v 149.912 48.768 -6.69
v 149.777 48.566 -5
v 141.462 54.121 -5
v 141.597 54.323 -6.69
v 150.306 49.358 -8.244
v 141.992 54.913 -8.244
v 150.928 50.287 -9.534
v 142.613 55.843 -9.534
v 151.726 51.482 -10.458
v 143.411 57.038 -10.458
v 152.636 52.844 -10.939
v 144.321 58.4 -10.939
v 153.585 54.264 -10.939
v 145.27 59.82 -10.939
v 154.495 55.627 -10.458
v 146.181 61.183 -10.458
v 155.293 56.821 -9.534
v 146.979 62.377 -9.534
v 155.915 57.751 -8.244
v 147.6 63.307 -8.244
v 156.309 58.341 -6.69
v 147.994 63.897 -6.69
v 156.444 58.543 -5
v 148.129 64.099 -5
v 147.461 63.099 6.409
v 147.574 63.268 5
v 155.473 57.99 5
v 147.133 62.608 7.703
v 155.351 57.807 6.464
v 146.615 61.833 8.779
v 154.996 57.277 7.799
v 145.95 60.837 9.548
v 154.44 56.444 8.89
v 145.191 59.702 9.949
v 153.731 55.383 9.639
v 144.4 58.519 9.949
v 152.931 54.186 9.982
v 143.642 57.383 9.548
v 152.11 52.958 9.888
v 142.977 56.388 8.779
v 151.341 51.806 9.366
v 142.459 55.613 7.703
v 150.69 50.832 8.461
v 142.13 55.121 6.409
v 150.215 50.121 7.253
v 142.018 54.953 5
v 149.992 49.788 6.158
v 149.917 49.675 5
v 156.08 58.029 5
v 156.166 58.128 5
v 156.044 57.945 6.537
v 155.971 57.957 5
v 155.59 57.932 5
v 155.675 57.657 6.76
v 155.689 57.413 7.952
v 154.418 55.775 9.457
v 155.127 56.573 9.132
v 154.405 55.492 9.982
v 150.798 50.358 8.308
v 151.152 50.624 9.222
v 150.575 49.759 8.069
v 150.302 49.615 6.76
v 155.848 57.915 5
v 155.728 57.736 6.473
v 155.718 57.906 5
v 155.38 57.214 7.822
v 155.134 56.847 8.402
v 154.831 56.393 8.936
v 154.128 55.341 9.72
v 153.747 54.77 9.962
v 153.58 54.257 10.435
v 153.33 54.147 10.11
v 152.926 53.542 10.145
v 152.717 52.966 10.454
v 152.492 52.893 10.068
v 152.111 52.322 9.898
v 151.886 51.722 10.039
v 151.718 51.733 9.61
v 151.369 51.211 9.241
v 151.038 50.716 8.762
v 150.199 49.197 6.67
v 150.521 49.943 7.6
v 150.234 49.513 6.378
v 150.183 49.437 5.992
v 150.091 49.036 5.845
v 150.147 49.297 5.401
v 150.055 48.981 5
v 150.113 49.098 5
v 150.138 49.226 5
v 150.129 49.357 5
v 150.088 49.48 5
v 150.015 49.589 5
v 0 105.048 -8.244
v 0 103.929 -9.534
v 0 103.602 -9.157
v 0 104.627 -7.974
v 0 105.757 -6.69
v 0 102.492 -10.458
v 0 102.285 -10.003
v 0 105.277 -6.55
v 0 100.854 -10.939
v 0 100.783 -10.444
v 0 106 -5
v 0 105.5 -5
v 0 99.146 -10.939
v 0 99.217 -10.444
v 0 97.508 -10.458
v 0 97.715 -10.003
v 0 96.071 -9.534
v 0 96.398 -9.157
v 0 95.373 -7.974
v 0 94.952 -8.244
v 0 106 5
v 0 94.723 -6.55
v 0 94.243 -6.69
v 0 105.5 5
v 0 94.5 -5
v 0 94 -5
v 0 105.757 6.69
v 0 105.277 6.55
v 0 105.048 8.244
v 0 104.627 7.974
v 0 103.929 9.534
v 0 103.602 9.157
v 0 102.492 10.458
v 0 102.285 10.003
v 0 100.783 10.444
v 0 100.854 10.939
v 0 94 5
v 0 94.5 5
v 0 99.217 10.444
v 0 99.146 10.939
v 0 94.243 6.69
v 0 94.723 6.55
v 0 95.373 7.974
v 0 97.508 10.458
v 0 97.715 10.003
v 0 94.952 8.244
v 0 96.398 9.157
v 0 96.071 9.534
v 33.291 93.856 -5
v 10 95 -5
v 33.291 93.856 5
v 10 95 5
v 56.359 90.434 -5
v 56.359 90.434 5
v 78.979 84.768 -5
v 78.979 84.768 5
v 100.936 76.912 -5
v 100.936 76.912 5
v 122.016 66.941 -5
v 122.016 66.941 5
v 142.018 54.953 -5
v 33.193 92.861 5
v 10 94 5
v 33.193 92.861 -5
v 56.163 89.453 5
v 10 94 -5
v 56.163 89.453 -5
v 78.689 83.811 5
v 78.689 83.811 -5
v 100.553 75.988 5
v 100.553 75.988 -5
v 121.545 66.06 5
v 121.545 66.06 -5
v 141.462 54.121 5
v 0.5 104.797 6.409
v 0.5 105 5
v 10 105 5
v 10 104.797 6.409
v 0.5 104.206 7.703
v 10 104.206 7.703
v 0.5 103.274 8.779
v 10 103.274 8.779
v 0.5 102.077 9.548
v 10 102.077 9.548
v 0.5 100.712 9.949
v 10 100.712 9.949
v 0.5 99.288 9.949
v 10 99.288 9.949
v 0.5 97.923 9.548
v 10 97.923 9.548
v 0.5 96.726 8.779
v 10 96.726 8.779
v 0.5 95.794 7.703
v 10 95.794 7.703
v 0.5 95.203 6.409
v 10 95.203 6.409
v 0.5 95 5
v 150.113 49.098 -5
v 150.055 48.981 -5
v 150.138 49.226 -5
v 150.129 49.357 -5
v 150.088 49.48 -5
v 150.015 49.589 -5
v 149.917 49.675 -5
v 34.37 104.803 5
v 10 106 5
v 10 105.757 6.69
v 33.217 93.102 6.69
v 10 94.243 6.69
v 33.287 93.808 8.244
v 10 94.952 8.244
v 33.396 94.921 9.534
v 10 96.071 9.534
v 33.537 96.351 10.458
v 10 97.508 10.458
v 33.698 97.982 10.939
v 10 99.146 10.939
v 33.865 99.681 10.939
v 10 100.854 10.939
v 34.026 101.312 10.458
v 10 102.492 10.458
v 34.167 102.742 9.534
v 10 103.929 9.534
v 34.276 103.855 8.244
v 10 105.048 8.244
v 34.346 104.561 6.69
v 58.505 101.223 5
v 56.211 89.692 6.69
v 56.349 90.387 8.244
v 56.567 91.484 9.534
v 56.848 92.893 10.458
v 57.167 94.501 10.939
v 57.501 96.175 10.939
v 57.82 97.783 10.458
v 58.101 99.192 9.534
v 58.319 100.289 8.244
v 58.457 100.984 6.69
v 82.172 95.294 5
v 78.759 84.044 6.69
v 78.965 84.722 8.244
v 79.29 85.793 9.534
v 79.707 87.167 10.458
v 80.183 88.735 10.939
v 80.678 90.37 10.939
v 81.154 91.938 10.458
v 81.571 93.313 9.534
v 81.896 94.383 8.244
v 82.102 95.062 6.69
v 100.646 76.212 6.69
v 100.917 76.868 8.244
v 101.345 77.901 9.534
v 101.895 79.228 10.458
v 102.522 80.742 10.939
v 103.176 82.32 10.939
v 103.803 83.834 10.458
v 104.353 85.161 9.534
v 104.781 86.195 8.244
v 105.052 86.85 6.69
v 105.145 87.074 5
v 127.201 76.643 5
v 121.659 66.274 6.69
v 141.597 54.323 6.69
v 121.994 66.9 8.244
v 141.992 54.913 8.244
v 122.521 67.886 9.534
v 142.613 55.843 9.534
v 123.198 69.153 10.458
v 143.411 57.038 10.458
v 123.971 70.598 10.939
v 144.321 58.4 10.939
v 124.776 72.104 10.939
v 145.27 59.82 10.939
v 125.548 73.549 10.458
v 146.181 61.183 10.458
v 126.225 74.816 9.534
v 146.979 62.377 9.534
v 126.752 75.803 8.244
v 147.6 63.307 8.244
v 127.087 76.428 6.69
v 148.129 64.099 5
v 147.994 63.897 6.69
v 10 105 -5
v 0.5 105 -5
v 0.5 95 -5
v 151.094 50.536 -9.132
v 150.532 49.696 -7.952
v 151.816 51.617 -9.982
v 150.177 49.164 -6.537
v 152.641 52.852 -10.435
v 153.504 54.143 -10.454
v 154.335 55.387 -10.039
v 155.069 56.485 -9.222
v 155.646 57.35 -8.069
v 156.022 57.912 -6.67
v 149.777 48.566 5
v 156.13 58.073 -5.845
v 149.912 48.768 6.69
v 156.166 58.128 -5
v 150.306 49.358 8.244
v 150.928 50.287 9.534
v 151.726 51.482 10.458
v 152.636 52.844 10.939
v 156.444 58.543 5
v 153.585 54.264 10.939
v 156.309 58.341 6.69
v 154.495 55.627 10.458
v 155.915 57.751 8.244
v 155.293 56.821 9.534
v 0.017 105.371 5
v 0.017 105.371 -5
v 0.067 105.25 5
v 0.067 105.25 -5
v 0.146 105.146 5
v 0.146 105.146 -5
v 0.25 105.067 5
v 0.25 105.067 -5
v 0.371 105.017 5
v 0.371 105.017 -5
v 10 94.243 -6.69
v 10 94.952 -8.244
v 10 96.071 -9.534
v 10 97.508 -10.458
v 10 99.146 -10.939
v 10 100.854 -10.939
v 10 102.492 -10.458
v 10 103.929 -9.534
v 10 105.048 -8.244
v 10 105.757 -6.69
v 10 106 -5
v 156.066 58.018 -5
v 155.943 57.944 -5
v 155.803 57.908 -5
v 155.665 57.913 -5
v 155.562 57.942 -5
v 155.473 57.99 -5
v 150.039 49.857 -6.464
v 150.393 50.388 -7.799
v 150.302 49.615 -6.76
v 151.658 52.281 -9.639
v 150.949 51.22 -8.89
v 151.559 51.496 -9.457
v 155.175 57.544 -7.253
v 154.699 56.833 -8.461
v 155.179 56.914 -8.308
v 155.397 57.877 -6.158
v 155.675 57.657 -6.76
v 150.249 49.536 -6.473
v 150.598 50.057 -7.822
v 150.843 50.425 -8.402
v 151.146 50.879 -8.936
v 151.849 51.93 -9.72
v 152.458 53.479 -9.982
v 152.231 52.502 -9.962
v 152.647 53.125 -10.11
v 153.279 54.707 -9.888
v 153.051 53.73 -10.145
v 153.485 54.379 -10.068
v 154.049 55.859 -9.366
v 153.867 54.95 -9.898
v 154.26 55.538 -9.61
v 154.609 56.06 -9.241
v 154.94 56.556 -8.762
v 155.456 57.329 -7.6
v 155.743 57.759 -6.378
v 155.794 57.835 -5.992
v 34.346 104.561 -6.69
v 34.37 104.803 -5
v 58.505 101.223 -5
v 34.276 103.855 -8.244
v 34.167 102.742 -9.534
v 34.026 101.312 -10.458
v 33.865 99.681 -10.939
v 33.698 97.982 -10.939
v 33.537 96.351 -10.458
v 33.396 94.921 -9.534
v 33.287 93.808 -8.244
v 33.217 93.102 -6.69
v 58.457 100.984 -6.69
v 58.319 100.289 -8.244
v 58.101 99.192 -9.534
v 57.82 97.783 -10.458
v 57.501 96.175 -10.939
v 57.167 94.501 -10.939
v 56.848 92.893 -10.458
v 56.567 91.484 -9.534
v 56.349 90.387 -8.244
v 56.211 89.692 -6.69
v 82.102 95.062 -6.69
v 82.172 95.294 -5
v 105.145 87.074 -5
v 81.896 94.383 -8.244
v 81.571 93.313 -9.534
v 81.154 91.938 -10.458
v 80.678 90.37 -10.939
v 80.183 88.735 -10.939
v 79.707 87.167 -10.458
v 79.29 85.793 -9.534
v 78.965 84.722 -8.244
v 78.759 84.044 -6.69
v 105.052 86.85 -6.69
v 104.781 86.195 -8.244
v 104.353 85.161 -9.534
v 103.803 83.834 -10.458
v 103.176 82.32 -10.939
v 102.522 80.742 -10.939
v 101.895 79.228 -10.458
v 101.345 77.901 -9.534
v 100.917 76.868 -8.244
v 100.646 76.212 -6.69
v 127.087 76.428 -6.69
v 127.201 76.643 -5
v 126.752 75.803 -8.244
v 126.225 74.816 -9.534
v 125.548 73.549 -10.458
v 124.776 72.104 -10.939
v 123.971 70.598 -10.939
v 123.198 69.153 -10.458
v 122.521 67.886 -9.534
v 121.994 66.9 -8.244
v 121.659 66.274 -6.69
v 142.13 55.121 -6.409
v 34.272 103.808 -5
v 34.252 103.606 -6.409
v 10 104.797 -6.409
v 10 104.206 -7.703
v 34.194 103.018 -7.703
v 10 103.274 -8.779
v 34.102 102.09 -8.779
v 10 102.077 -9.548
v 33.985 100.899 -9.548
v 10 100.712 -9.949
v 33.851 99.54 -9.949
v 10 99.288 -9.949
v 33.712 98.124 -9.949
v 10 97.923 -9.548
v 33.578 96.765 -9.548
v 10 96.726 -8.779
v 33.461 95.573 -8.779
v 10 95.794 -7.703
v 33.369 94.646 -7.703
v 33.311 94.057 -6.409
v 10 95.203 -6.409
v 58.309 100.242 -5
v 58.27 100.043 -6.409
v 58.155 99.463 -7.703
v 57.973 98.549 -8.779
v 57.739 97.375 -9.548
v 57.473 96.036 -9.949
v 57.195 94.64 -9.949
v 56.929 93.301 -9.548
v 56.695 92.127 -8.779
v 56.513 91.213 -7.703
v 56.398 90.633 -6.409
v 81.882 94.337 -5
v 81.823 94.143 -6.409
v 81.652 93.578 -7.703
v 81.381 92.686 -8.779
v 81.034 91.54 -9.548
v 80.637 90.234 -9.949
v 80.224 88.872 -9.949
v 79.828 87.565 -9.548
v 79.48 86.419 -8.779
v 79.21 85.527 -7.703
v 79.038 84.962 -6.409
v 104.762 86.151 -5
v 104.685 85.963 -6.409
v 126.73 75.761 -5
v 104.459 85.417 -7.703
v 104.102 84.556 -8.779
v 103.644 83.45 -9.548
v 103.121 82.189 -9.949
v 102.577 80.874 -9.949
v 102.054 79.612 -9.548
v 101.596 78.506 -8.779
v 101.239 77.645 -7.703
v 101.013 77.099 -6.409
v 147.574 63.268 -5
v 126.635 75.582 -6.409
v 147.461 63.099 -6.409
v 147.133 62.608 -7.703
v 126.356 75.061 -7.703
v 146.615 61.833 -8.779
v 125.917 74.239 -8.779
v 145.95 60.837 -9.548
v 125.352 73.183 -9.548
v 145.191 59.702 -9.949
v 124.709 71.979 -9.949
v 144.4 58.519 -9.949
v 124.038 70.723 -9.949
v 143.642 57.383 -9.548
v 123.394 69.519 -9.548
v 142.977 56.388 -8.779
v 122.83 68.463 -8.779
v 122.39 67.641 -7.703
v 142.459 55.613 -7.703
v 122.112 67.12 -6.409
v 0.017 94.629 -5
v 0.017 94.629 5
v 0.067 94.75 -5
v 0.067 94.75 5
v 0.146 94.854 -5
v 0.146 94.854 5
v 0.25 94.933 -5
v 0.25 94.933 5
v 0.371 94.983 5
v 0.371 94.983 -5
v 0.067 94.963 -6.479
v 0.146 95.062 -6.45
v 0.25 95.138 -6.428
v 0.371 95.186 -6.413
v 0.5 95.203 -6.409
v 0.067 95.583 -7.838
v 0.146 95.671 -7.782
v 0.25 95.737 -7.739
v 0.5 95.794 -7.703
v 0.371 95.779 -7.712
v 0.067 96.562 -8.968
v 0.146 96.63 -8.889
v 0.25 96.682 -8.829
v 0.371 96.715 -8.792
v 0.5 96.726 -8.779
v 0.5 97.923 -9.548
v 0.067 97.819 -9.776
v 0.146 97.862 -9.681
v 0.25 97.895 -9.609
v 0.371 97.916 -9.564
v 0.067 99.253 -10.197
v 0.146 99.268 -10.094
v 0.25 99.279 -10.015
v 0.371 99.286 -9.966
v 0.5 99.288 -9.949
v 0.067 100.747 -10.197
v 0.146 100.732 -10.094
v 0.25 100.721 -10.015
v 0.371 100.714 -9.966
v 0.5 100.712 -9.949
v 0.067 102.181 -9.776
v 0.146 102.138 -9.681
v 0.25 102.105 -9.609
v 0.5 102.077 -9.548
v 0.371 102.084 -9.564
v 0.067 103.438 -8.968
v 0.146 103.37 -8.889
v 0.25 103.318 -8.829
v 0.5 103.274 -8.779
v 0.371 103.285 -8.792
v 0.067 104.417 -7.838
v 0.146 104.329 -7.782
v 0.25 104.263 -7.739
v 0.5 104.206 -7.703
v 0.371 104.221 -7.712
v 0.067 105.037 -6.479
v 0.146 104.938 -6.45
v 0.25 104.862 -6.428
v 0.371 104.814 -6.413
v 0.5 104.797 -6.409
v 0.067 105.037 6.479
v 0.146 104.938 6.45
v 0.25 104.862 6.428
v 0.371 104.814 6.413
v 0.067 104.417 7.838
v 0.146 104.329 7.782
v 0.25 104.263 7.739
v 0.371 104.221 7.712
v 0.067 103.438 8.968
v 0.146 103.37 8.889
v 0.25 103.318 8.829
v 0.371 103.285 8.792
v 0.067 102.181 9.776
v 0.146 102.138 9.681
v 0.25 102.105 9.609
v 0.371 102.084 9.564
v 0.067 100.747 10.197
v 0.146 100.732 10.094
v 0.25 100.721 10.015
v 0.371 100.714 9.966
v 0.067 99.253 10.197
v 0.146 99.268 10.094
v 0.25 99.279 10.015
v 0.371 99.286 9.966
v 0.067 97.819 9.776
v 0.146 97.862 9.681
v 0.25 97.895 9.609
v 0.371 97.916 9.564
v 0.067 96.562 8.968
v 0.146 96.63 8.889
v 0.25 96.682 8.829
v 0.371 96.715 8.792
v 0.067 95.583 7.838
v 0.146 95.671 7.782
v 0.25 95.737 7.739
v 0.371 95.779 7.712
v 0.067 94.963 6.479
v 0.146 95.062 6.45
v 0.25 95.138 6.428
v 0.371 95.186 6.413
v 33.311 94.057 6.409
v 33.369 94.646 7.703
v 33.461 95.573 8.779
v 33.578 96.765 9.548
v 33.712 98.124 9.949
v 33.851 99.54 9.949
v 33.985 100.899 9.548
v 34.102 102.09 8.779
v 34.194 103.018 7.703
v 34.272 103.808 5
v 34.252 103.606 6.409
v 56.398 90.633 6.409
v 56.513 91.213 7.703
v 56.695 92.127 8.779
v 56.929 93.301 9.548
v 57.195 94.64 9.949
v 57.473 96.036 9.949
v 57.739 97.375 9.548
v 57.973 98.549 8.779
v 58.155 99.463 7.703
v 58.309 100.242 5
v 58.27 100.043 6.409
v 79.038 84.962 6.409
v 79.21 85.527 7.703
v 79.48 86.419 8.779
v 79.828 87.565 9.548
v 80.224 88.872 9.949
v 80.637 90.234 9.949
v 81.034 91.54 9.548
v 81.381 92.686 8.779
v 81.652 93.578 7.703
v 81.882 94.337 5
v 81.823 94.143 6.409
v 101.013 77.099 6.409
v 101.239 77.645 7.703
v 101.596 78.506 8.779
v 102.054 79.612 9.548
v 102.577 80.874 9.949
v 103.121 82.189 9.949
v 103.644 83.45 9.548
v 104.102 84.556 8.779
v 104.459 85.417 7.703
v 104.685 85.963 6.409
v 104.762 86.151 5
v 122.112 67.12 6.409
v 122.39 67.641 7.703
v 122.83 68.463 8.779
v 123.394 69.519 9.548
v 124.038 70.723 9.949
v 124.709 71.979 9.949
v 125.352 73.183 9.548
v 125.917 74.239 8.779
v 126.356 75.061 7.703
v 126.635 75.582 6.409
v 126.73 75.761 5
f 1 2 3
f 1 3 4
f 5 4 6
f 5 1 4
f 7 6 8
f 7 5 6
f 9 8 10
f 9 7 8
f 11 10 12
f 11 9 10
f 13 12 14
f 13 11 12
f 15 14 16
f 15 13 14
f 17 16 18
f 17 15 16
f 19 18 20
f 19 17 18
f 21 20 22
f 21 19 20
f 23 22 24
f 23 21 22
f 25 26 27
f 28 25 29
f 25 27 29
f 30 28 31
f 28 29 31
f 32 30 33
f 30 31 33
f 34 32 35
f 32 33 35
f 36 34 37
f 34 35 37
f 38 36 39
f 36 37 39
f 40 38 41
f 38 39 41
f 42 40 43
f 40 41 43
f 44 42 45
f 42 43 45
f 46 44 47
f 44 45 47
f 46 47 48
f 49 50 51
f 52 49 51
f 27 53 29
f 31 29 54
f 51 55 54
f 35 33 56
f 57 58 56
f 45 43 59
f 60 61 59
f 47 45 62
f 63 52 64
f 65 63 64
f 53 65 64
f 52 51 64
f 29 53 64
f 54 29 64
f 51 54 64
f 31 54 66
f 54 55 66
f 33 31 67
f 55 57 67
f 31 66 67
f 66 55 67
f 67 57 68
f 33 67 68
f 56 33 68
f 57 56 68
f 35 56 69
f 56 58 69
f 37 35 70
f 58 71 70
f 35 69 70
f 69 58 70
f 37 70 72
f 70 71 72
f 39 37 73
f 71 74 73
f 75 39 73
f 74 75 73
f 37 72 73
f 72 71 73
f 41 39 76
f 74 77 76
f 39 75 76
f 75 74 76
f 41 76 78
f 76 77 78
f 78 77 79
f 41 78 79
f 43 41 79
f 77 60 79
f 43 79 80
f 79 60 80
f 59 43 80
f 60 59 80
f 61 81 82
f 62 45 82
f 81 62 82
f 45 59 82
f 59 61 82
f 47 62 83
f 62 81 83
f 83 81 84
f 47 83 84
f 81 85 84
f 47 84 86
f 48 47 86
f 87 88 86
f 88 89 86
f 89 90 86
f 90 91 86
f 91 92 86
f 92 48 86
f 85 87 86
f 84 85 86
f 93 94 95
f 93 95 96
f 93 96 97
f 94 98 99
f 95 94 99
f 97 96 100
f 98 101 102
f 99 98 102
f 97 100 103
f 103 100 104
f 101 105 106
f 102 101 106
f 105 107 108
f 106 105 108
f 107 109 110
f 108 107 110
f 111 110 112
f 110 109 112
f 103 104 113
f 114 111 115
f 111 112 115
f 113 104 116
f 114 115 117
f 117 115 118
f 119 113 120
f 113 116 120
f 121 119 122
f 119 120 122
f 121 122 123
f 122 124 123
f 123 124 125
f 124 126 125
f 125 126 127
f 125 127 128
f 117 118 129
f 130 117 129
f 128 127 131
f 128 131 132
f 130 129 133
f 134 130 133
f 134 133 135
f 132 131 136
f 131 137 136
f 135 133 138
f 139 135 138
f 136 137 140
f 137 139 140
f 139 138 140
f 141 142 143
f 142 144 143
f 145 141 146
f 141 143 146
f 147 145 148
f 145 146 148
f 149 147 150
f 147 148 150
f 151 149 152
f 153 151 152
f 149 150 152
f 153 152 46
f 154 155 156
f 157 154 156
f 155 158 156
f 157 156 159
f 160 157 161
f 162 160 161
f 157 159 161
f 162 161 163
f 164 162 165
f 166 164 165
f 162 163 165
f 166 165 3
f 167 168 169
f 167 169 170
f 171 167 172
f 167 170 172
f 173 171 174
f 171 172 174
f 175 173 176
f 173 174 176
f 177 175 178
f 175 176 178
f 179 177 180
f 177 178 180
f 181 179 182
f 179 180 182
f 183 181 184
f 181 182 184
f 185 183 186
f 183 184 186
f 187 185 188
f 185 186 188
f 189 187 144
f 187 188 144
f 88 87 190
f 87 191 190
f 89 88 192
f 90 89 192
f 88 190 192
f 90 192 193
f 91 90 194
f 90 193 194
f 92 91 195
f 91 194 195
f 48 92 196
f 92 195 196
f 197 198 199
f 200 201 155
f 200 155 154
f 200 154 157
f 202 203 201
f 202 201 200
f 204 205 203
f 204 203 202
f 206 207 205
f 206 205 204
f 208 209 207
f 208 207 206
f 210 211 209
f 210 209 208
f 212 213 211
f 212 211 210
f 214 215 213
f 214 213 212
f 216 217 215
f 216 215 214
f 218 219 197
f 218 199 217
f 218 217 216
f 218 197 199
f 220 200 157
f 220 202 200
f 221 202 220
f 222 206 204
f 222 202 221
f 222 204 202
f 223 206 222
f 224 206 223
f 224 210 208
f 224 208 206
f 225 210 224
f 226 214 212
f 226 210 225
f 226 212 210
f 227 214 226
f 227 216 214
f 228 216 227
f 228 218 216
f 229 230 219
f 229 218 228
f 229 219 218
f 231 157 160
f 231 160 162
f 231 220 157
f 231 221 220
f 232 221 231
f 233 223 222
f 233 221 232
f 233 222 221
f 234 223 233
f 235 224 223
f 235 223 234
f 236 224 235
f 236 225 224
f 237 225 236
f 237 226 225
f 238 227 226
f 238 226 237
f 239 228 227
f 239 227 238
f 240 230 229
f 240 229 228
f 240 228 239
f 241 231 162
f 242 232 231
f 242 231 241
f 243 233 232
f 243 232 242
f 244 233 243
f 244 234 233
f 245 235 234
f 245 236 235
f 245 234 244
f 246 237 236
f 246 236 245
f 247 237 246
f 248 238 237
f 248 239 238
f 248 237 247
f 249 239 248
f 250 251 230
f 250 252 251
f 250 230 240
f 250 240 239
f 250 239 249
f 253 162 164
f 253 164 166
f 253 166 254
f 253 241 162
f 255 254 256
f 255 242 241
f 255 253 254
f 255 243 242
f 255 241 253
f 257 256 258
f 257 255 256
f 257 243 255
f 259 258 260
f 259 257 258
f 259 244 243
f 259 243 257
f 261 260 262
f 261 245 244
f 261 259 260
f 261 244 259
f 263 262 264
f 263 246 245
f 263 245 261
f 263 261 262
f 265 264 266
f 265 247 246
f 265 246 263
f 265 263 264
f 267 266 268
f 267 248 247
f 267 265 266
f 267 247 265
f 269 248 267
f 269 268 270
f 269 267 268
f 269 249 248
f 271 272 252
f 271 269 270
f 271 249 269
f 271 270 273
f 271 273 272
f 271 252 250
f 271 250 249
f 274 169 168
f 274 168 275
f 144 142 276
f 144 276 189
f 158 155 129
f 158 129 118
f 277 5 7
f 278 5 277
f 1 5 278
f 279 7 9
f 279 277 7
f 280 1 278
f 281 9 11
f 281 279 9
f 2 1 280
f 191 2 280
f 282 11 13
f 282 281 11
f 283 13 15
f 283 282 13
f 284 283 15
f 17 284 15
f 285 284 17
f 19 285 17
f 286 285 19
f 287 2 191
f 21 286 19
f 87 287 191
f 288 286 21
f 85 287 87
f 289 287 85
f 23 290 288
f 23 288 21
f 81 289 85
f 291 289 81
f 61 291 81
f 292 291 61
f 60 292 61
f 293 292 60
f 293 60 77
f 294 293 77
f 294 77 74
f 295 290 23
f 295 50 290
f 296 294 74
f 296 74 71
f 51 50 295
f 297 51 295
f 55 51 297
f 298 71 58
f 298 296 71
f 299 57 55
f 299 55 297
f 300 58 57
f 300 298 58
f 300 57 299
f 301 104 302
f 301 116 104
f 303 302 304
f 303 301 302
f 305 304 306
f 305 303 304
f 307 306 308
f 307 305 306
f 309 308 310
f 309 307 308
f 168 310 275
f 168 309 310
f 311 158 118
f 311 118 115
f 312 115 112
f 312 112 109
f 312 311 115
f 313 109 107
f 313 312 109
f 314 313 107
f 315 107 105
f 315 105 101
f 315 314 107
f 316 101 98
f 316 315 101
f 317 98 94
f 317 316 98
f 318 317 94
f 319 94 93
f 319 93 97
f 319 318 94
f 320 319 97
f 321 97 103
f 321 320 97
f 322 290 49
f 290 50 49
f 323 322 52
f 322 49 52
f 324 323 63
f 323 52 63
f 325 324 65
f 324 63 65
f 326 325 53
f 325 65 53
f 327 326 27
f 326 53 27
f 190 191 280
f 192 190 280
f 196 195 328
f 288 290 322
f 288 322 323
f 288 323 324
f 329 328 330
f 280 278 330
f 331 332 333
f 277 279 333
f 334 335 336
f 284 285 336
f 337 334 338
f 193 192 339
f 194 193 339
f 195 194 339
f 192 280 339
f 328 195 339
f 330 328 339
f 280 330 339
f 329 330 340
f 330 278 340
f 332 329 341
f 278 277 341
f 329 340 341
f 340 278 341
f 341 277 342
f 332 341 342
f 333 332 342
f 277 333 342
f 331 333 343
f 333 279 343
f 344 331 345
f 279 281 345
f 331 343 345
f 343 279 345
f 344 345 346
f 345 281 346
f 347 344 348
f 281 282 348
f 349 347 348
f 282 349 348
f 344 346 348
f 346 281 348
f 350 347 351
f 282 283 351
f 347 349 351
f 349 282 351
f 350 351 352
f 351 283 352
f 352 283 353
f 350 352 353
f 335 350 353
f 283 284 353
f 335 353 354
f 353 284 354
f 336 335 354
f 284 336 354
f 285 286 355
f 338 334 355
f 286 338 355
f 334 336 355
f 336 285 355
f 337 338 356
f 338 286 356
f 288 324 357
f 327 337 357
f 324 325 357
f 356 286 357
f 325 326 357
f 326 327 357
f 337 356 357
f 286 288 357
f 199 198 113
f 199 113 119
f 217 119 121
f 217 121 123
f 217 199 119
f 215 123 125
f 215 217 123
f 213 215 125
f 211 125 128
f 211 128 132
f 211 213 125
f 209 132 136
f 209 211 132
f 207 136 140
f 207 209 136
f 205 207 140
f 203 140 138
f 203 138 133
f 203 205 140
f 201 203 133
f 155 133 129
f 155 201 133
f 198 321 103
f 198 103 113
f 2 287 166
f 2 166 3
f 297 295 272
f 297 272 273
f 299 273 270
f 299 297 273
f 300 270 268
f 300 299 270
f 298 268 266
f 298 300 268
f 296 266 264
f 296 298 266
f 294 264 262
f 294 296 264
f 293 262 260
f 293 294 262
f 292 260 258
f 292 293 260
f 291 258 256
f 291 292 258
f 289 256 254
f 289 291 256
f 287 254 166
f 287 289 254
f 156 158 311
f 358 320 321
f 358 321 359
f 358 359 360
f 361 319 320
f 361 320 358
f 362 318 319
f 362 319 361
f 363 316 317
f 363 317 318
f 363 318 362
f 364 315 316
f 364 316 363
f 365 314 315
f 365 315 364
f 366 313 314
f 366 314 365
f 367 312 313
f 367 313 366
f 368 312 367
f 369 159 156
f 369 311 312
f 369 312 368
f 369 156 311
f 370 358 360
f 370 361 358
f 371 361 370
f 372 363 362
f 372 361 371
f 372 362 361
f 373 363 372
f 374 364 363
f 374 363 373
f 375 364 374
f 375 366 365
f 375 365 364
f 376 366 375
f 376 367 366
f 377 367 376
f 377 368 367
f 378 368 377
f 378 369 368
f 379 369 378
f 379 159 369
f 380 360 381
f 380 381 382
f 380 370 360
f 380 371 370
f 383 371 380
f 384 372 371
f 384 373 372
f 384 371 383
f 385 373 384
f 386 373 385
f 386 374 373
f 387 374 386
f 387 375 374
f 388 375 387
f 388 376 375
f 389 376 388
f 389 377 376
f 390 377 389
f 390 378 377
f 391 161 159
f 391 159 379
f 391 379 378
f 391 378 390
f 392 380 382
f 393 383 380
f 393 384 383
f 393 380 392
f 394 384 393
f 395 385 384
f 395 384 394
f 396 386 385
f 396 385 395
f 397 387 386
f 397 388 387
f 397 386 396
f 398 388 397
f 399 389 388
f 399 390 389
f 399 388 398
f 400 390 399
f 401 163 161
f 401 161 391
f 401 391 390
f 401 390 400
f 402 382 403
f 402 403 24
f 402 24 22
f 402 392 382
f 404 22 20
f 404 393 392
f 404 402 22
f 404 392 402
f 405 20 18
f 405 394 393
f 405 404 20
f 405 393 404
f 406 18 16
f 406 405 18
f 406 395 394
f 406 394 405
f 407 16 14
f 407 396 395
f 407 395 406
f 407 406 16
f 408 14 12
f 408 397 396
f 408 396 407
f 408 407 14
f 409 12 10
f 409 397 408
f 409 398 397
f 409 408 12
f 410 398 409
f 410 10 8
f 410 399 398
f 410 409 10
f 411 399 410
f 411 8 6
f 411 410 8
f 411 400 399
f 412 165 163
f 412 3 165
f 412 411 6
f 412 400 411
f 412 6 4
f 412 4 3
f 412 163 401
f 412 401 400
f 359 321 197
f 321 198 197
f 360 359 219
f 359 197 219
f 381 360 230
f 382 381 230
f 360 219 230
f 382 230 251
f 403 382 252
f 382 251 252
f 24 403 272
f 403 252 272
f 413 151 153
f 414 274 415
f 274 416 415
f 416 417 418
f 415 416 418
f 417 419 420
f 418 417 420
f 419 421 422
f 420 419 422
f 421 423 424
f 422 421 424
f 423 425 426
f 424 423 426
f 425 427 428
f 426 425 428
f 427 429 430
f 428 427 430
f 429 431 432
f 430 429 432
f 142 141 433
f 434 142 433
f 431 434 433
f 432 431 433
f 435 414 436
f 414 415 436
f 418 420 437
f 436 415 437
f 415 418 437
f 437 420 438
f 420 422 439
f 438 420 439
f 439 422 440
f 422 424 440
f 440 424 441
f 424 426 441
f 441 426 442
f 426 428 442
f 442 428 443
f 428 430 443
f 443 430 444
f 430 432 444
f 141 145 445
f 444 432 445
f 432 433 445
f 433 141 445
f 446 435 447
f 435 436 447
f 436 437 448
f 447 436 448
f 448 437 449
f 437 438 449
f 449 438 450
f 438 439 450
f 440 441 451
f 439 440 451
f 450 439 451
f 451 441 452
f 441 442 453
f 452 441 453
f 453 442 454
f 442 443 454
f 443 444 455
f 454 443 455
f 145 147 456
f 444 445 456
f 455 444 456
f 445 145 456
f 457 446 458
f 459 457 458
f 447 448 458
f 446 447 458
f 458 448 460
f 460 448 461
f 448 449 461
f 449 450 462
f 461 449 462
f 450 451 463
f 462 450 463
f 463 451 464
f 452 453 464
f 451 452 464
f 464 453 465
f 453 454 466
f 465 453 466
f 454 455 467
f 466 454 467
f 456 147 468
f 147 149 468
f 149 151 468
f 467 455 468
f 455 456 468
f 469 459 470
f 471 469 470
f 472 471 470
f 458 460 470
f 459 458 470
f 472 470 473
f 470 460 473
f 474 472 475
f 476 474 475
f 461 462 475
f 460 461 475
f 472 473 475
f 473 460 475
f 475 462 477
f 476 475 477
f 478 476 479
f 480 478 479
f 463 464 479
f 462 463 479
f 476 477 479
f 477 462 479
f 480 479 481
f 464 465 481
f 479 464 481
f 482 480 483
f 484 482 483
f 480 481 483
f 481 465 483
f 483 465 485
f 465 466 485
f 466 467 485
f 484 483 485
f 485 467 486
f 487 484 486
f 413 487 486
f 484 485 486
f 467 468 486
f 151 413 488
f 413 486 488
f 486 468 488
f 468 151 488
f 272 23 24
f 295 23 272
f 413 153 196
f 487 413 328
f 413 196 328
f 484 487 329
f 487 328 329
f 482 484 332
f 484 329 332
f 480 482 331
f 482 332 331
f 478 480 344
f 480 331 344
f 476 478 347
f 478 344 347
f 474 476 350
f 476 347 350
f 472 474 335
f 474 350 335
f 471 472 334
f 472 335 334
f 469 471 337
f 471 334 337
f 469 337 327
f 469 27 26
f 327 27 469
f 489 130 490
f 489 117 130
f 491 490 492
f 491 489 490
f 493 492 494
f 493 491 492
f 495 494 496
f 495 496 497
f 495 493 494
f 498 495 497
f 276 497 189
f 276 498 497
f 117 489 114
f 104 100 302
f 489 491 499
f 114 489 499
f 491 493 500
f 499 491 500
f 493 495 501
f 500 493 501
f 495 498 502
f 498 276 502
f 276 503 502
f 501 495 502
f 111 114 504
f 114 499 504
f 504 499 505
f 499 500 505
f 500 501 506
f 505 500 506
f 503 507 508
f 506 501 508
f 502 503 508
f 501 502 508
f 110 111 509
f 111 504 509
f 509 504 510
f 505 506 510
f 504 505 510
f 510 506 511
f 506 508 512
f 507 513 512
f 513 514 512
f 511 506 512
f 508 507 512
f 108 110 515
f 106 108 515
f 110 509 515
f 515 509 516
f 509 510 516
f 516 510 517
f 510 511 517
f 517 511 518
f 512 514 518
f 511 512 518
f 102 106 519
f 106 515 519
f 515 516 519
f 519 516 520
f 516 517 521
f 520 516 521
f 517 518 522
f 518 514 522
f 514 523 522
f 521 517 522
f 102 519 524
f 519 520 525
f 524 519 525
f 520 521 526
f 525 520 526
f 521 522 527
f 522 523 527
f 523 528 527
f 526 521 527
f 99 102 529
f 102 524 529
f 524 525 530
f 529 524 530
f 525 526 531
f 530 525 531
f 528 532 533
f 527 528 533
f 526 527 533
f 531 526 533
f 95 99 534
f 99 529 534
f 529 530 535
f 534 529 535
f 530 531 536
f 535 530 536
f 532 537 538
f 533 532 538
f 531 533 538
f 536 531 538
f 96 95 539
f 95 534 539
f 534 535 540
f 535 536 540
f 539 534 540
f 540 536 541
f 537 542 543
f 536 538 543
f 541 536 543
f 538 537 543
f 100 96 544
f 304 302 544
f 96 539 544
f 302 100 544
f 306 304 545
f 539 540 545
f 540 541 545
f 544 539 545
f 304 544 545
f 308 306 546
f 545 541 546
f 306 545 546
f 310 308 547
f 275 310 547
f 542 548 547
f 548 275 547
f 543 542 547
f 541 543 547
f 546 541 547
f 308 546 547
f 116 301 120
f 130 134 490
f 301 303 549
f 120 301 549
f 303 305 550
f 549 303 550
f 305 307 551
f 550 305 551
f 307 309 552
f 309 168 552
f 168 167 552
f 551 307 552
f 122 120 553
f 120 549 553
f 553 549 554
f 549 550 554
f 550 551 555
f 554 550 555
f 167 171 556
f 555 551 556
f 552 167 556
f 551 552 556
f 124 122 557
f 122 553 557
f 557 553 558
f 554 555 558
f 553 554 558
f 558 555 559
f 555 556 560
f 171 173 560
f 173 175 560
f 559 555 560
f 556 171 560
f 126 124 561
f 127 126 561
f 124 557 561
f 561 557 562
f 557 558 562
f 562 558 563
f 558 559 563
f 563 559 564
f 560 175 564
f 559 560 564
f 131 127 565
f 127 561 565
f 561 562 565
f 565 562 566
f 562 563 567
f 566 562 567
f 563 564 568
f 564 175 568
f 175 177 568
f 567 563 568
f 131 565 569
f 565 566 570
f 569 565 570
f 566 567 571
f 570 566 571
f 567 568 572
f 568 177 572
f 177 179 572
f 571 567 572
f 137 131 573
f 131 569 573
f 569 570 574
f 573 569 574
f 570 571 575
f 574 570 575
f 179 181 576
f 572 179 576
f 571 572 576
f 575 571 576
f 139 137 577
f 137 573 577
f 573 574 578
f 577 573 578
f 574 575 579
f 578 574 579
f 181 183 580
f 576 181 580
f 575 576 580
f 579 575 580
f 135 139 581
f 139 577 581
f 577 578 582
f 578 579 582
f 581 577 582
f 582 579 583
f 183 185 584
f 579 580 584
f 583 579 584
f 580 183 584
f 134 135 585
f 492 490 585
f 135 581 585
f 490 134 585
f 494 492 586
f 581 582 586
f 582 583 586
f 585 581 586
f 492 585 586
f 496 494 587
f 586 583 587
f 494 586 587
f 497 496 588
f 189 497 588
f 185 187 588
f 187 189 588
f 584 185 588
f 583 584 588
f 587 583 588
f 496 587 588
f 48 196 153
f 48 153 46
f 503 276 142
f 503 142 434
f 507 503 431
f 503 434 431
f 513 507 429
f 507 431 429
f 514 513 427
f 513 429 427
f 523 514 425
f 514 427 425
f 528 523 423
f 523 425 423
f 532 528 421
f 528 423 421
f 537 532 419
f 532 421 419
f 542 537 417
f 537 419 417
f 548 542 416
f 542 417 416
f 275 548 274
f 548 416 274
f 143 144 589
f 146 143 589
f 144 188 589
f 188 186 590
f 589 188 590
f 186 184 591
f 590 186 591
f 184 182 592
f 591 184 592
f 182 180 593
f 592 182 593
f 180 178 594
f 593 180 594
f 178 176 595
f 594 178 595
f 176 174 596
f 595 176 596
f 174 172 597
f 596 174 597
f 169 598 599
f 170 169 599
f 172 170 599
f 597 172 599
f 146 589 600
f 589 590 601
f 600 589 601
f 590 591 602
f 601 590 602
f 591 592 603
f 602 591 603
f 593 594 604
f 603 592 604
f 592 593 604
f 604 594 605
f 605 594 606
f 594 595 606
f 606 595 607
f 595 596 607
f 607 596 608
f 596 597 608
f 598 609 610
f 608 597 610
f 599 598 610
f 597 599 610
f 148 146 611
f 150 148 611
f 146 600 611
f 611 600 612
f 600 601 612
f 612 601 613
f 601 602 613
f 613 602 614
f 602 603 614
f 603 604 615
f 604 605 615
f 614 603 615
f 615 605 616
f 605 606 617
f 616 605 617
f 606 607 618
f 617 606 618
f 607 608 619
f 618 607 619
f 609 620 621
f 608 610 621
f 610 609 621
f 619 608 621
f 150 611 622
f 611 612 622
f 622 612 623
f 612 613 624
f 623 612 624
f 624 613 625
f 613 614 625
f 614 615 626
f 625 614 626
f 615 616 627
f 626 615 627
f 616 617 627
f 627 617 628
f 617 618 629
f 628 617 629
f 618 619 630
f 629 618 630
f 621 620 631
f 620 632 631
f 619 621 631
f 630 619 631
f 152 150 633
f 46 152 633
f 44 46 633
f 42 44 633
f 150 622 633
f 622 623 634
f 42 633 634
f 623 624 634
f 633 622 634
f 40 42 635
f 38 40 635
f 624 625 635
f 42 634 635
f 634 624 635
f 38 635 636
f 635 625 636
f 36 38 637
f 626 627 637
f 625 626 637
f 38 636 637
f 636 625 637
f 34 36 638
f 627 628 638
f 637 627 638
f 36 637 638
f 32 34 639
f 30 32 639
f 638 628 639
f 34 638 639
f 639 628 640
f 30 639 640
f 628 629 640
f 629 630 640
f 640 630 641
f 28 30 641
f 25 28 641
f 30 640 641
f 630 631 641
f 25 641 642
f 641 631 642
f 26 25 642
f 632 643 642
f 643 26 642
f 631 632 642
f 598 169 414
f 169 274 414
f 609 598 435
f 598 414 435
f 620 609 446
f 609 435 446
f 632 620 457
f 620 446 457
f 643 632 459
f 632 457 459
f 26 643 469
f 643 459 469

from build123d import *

# Parameters (mm, degrees)
FILLET1_R = 0.5


with BuildPart() as part:
    # Sweep1: sweep along a path in Sketch2path
    with BuildLine(Plane.XY) as sweep1_path:
        Line((0, 100), (10, 100))
        ThreePointArc((10, 100), (80.430596643, 89.552607894), (144.795757594, 59.110153969))
        Line((144.795757594, 59.110153969), (153.110453717, 53.554451639))
    # Sketch3 → Sweep1 (sweep)
    with BuildSketch(Plane(origin=(0, 0, 0), x_dir=(0, 0, -1), z_dir=(1, 0, 0))):
        with BuildLine():
            Line((-5, 106), (5, 106))
            ThreePointArc((5, 106), (11, 100), (5, 94))
            Line((5, 94), (-5, 94))
            ThreePointArc((-5, 94), (-11, 100), (-5, 106))
        make_face()
        with BuildLine():
            Line((-5, 105), (5, 105))
            ThreePointArc((5, 105), (10, 100), (5, 95))
            Line((5, 95), (-5, 95))
            ThreePointArc((-5, 95), (-10, 100), (-5, 105))
        make_face(mode=Mode.SUBTRACT)
    sweep(path=sweep1_path.line)

    # Fillet1
    fillet1_edges = [part.edges().sort_by_distance(p)[0] for p in [
        (0, 100, -10),
        (0, 105, 0),
        (0, 100, 10),
        (153.110453717, 53.554451639, 10),
        (150.332602552, 49.397103578, 0),
        (153.110453717, 53.554451639, -10),
        (155.888304882, 57.711799701, 0),
        (0, 95, 0),
    ]]
    fillet(fillet1_edges, radius=FILLET1_R)


solid = part.part
